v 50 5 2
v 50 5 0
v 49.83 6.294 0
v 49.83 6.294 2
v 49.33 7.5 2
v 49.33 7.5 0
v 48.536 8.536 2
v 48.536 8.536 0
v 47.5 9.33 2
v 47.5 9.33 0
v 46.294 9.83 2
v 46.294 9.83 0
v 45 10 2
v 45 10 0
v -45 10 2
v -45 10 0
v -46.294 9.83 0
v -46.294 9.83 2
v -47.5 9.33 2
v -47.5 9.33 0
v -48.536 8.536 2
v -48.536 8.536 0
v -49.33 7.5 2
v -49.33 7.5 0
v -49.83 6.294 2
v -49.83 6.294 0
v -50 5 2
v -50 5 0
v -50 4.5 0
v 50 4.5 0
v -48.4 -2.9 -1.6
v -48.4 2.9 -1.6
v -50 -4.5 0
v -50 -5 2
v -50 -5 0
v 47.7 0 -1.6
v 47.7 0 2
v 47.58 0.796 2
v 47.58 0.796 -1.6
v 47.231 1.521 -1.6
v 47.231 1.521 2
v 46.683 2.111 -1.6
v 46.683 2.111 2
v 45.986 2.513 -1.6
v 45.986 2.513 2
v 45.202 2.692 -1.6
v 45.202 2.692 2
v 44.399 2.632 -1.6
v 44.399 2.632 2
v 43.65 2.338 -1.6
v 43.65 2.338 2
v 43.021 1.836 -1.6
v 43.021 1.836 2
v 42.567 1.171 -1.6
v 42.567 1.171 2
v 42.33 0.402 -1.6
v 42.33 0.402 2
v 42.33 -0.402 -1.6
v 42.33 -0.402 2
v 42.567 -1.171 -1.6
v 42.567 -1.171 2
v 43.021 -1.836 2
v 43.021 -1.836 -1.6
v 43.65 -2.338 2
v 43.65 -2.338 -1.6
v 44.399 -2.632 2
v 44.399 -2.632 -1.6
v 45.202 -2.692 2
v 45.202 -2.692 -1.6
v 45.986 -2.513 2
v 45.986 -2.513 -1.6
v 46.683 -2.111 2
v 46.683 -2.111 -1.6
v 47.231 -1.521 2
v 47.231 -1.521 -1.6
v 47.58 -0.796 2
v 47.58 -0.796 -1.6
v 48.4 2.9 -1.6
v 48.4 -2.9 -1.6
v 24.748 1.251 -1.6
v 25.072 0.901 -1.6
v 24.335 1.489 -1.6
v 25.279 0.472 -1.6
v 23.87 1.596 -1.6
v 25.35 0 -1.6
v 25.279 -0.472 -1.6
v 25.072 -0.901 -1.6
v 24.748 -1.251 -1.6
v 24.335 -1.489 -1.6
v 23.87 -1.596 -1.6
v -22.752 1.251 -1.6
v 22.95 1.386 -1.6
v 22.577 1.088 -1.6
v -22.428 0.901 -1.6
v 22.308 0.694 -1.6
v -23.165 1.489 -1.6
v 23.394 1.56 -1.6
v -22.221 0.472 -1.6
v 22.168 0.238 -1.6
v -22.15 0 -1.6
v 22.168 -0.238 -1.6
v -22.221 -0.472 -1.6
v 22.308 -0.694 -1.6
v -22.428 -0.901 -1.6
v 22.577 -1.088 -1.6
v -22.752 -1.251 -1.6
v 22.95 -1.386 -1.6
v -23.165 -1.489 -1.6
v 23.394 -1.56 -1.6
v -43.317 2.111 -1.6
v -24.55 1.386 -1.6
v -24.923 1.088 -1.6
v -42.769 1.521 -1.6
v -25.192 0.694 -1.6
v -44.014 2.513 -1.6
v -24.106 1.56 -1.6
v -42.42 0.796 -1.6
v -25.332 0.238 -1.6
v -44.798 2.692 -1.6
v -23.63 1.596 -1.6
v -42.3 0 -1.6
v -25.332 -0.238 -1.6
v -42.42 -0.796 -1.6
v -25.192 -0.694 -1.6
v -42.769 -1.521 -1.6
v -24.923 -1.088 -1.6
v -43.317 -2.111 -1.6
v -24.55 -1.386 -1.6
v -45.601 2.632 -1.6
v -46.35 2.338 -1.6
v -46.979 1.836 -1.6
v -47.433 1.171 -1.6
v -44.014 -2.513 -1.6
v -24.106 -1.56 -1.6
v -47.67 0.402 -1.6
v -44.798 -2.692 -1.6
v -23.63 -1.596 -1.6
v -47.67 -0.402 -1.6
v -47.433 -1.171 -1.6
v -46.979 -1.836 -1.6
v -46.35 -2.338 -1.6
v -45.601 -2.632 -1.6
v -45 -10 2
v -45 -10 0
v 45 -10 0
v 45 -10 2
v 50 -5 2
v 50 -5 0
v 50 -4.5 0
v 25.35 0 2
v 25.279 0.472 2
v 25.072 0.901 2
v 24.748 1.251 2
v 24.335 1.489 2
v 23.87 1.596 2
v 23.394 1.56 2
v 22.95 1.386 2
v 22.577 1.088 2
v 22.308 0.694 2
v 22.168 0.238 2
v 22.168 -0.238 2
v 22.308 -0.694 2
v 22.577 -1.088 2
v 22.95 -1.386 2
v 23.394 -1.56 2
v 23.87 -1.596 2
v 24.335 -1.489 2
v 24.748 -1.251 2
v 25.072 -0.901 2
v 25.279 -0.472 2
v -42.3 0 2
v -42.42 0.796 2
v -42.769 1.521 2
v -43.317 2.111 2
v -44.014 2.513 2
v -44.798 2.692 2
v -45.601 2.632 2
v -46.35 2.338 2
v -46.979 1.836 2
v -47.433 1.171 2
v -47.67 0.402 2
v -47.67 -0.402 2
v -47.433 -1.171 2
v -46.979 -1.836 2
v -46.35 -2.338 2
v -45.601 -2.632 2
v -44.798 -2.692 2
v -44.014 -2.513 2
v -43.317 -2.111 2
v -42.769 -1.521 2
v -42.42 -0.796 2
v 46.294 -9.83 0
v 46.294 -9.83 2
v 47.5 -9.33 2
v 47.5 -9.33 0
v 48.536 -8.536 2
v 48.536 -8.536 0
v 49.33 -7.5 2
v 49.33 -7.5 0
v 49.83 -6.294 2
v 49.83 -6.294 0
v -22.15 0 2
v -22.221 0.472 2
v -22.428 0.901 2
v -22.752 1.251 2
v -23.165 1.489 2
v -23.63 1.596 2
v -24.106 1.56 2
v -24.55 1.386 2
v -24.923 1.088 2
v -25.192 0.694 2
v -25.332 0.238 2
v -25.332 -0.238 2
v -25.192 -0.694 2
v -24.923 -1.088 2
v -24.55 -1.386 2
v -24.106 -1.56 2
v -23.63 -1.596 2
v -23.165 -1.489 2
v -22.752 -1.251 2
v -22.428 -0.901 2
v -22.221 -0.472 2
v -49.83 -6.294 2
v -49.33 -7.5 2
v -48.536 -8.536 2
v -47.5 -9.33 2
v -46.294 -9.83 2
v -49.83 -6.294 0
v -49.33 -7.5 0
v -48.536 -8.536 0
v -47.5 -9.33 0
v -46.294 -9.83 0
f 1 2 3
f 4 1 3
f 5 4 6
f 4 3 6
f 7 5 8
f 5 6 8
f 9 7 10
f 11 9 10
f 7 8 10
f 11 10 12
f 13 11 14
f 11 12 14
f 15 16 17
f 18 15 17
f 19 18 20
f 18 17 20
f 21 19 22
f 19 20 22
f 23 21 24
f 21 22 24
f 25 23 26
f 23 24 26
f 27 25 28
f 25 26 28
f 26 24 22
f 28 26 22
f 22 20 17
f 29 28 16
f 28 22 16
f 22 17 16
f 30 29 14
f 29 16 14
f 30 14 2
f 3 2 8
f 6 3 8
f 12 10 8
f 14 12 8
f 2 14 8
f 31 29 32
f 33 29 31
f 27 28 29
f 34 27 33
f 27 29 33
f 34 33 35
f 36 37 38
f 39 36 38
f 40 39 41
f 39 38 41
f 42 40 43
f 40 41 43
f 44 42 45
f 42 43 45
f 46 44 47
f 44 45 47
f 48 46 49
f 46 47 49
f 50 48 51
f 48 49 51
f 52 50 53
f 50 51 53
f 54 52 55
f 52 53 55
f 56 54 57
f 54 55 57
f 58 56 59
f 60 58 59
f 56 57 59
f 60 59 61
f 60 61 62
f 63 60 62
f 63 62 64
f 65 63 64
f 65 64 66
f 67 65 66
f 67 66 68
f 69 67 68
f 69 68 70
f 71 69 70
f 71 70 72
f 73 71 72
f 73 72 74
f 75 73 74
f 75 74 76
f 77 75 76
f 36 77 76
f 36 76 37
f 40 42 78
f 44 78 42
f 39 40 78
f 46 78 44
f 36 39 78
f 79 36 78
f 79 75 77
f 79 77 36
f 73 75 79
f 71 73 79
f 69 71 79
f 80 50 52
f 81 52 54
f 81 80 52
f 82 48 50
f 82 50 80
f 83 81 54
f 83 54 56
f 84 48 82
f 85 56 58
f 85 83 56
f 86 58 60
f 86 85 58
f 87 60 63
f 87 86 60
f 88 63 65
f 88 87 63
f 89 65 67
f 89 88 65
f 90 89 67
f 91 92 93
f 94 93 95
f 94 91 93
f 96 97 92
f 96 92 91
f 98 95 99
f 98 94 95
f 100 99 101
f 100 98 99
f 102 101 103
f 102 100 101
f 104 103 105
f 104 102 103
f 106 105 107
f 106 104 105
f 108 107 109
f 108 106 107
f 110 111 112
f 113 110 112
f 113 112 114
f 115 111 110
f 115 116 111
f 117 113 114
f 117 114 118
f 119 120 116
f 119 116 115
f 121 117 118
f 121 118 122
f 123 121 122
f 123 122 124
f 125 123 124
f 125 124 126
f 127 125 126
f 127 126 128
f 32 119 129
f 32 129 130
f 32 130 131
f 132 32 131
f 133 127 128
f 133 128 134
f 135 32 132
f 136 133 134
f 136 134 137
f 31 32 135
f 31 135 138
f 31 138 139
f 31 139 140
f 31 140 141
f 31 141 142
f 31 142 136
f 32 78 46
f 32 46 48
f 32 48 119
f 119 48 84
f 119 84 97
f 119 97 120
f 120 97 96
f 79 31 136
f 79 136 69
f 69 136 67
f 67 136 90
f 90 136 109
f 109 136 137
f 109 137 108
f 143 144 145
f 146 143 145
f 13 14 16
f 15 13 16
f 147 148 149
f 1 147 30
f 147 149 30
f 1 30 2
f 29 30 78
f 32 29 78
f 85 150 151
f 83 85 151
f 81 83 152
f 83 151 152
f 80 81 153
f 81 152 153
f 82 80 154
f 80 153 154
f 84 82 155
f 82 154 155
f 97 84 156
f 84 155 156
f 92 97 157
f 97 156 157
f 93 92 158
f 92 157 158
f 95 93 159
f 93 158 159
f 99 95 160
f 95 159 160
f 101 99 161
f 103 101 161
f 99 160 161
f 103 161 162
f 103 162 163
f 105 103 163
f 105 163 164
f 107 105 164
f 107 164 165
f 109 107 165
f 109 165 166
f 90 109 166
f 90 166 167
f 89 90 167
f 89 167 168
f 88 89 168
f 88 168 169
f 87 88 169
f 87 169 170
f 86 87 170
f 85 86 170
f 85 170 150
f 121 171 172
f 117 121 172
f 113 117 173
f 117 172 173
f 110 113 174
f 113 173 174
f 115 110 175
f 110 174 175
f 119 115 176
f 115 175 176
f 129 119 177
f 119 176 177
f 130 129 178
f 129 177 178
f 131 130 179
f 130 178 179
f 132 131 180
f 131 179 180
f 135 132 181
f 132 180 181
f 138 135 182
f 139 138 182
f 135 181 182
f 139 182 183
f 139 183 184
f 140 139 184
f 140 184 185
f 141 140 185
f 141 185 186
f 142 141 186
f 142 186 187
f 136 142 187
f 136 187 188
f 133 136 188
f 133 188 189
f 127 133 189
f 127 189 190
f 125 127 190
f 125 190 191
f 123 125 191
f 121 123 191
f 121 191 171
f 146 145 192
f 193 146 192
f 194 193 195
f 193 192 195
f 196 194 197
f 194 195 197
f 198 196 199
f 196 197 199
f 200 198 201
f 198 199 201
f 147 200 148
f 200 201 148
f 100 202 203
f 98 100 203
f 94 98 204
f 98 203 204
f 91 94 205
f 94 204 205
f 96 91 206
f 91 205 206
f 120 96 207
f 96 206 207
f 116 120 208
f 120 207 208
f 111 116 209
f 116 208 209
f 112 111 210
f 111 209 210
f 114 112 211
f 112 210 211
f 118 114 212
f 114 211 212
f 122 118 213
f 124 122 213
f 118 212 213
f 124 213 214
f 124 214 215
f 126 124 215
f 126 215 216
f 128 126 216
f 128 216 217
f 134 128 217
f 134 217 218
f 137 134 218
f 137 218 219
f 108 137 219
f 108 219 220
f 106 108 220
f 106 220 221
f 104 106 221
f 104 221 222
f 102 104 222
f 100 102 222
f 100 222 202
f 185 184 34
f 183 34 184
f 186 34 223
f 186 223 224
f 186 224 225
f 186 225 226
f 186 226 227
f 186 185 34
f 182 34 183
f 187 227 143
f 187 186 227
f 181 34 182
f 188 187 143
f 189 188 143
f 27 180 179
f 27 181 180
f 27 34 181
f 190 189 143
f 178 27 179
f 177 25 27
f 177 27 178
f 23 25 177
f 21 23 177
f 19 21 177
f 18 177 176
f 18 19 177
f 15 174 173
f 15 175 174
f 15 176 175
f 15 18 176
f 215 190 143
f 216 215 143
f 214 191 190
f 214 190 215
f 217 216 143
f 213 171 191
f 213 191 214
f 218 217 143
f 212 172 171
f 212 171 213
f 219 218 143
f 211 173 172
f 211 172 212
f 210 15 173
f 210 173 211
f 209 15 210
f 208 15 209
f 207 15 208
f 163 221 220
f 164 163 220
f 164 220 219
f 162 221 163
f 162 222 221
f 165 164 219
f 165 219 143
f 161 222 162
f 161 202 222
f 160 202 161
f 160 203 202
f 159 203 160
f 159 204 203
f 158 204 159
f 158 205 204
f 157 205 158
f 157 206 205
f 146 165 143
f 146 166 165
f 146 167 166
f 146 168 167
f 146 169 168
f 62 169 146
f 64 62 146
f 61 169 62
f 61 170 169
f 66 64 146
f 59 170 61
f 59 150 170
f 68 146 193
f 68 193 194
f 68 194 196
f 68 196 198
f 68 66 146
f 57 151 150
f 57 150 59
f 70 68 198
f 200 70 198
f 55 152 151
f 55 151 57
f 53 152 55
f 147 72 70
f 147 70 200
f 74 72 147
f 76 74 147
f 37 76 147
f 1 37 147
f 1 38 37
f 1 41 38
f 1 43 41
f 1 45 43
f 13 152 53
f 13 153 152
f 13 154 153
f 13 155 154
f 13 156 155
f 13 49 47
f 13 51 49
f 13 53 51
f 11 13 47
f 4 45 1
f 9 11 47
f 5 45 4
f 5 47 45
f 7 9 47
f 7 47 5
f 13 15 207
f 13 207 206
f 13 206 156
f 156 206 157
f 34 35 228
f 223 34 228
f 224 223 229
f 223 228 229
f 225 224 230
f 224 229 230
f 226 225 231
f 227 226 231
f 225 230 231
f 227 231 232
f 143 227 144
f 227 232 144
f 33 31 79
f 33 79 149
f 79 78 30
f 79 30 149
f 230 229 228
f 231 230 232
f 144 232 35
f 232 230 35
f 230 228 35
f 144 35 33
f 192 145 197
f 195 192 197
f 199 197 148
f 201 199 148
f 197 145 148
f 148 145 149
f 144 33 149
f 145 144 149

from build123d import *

# Parameters (mm, degrees)
F1_DEPTH = 2
F3_DEPTH = 100
F4_R     = 2.7
F4_R_2   = 1.6
F5_DEPTH = 3.601
F6_SIZE  = 1.6


with BuildPart() as f1:
    # F0 (on Top) → F1 (new body)
    with BuildSketch(Plane.XY):
        with BuildLine():
            ThreePointArc((50, 5), (48.535534, 8.535534), (45, 10))
            Line((45, 10), (-45, 10))
            ThreePointArc((-45, 10), (-48.535534, 8.535534), (-50, 5))
            Line((-50, 5), (-50, -5))
            ThreePointArc((-50, -5), (-48.535534, -8.535534), (-45, -10))
            Line((-45, -10), (45, -10))
            ThreePointArc((45, -10), (48.535534, -8.535534), (50, -5))
            Line((50, -5), (50, 5))
        make_face()
    extrude(amount=F1_DEPTH)

    # F2 (on face) → F3 (join, through all)
    with BuildSketch(Plane(origin=(-50, 0, 0), x_dir=(0, -1, 0), z_dir=(-1, 0, 0))):
        Polygon((-4.5, 0), (-2.9, -1.6), (2.9, -1.6), (4.5, 0), align=None)
    extrude(amount=-F3_DEPTH)

    # F4 (on face) → F5 (cut, through all)
    with BuildSketch(Plane.XY.offset(2)):
        with Locations((-45, 0)):
            Circle(F4_R)
        with Locations((45, 0)):
            Circle(F4_R)
        with Locations((23.75, 0)):
            Circle(F4_R_2)
        with Locations((-23.75, 0)):
            Circle(F4_R_2)
    extrude(amount=-F5_DEPTH, mode=Mode.SUBTRACT)

    # F6
    f6_edges = [f1.edges().sort_by_distance(p)[0] for p in [
        (-50, 0, -1.6),
        (50, 0, -1.6),
    ]]
    chamfer(f6_edges, length=F6_SIZE)


solid = f1.part
